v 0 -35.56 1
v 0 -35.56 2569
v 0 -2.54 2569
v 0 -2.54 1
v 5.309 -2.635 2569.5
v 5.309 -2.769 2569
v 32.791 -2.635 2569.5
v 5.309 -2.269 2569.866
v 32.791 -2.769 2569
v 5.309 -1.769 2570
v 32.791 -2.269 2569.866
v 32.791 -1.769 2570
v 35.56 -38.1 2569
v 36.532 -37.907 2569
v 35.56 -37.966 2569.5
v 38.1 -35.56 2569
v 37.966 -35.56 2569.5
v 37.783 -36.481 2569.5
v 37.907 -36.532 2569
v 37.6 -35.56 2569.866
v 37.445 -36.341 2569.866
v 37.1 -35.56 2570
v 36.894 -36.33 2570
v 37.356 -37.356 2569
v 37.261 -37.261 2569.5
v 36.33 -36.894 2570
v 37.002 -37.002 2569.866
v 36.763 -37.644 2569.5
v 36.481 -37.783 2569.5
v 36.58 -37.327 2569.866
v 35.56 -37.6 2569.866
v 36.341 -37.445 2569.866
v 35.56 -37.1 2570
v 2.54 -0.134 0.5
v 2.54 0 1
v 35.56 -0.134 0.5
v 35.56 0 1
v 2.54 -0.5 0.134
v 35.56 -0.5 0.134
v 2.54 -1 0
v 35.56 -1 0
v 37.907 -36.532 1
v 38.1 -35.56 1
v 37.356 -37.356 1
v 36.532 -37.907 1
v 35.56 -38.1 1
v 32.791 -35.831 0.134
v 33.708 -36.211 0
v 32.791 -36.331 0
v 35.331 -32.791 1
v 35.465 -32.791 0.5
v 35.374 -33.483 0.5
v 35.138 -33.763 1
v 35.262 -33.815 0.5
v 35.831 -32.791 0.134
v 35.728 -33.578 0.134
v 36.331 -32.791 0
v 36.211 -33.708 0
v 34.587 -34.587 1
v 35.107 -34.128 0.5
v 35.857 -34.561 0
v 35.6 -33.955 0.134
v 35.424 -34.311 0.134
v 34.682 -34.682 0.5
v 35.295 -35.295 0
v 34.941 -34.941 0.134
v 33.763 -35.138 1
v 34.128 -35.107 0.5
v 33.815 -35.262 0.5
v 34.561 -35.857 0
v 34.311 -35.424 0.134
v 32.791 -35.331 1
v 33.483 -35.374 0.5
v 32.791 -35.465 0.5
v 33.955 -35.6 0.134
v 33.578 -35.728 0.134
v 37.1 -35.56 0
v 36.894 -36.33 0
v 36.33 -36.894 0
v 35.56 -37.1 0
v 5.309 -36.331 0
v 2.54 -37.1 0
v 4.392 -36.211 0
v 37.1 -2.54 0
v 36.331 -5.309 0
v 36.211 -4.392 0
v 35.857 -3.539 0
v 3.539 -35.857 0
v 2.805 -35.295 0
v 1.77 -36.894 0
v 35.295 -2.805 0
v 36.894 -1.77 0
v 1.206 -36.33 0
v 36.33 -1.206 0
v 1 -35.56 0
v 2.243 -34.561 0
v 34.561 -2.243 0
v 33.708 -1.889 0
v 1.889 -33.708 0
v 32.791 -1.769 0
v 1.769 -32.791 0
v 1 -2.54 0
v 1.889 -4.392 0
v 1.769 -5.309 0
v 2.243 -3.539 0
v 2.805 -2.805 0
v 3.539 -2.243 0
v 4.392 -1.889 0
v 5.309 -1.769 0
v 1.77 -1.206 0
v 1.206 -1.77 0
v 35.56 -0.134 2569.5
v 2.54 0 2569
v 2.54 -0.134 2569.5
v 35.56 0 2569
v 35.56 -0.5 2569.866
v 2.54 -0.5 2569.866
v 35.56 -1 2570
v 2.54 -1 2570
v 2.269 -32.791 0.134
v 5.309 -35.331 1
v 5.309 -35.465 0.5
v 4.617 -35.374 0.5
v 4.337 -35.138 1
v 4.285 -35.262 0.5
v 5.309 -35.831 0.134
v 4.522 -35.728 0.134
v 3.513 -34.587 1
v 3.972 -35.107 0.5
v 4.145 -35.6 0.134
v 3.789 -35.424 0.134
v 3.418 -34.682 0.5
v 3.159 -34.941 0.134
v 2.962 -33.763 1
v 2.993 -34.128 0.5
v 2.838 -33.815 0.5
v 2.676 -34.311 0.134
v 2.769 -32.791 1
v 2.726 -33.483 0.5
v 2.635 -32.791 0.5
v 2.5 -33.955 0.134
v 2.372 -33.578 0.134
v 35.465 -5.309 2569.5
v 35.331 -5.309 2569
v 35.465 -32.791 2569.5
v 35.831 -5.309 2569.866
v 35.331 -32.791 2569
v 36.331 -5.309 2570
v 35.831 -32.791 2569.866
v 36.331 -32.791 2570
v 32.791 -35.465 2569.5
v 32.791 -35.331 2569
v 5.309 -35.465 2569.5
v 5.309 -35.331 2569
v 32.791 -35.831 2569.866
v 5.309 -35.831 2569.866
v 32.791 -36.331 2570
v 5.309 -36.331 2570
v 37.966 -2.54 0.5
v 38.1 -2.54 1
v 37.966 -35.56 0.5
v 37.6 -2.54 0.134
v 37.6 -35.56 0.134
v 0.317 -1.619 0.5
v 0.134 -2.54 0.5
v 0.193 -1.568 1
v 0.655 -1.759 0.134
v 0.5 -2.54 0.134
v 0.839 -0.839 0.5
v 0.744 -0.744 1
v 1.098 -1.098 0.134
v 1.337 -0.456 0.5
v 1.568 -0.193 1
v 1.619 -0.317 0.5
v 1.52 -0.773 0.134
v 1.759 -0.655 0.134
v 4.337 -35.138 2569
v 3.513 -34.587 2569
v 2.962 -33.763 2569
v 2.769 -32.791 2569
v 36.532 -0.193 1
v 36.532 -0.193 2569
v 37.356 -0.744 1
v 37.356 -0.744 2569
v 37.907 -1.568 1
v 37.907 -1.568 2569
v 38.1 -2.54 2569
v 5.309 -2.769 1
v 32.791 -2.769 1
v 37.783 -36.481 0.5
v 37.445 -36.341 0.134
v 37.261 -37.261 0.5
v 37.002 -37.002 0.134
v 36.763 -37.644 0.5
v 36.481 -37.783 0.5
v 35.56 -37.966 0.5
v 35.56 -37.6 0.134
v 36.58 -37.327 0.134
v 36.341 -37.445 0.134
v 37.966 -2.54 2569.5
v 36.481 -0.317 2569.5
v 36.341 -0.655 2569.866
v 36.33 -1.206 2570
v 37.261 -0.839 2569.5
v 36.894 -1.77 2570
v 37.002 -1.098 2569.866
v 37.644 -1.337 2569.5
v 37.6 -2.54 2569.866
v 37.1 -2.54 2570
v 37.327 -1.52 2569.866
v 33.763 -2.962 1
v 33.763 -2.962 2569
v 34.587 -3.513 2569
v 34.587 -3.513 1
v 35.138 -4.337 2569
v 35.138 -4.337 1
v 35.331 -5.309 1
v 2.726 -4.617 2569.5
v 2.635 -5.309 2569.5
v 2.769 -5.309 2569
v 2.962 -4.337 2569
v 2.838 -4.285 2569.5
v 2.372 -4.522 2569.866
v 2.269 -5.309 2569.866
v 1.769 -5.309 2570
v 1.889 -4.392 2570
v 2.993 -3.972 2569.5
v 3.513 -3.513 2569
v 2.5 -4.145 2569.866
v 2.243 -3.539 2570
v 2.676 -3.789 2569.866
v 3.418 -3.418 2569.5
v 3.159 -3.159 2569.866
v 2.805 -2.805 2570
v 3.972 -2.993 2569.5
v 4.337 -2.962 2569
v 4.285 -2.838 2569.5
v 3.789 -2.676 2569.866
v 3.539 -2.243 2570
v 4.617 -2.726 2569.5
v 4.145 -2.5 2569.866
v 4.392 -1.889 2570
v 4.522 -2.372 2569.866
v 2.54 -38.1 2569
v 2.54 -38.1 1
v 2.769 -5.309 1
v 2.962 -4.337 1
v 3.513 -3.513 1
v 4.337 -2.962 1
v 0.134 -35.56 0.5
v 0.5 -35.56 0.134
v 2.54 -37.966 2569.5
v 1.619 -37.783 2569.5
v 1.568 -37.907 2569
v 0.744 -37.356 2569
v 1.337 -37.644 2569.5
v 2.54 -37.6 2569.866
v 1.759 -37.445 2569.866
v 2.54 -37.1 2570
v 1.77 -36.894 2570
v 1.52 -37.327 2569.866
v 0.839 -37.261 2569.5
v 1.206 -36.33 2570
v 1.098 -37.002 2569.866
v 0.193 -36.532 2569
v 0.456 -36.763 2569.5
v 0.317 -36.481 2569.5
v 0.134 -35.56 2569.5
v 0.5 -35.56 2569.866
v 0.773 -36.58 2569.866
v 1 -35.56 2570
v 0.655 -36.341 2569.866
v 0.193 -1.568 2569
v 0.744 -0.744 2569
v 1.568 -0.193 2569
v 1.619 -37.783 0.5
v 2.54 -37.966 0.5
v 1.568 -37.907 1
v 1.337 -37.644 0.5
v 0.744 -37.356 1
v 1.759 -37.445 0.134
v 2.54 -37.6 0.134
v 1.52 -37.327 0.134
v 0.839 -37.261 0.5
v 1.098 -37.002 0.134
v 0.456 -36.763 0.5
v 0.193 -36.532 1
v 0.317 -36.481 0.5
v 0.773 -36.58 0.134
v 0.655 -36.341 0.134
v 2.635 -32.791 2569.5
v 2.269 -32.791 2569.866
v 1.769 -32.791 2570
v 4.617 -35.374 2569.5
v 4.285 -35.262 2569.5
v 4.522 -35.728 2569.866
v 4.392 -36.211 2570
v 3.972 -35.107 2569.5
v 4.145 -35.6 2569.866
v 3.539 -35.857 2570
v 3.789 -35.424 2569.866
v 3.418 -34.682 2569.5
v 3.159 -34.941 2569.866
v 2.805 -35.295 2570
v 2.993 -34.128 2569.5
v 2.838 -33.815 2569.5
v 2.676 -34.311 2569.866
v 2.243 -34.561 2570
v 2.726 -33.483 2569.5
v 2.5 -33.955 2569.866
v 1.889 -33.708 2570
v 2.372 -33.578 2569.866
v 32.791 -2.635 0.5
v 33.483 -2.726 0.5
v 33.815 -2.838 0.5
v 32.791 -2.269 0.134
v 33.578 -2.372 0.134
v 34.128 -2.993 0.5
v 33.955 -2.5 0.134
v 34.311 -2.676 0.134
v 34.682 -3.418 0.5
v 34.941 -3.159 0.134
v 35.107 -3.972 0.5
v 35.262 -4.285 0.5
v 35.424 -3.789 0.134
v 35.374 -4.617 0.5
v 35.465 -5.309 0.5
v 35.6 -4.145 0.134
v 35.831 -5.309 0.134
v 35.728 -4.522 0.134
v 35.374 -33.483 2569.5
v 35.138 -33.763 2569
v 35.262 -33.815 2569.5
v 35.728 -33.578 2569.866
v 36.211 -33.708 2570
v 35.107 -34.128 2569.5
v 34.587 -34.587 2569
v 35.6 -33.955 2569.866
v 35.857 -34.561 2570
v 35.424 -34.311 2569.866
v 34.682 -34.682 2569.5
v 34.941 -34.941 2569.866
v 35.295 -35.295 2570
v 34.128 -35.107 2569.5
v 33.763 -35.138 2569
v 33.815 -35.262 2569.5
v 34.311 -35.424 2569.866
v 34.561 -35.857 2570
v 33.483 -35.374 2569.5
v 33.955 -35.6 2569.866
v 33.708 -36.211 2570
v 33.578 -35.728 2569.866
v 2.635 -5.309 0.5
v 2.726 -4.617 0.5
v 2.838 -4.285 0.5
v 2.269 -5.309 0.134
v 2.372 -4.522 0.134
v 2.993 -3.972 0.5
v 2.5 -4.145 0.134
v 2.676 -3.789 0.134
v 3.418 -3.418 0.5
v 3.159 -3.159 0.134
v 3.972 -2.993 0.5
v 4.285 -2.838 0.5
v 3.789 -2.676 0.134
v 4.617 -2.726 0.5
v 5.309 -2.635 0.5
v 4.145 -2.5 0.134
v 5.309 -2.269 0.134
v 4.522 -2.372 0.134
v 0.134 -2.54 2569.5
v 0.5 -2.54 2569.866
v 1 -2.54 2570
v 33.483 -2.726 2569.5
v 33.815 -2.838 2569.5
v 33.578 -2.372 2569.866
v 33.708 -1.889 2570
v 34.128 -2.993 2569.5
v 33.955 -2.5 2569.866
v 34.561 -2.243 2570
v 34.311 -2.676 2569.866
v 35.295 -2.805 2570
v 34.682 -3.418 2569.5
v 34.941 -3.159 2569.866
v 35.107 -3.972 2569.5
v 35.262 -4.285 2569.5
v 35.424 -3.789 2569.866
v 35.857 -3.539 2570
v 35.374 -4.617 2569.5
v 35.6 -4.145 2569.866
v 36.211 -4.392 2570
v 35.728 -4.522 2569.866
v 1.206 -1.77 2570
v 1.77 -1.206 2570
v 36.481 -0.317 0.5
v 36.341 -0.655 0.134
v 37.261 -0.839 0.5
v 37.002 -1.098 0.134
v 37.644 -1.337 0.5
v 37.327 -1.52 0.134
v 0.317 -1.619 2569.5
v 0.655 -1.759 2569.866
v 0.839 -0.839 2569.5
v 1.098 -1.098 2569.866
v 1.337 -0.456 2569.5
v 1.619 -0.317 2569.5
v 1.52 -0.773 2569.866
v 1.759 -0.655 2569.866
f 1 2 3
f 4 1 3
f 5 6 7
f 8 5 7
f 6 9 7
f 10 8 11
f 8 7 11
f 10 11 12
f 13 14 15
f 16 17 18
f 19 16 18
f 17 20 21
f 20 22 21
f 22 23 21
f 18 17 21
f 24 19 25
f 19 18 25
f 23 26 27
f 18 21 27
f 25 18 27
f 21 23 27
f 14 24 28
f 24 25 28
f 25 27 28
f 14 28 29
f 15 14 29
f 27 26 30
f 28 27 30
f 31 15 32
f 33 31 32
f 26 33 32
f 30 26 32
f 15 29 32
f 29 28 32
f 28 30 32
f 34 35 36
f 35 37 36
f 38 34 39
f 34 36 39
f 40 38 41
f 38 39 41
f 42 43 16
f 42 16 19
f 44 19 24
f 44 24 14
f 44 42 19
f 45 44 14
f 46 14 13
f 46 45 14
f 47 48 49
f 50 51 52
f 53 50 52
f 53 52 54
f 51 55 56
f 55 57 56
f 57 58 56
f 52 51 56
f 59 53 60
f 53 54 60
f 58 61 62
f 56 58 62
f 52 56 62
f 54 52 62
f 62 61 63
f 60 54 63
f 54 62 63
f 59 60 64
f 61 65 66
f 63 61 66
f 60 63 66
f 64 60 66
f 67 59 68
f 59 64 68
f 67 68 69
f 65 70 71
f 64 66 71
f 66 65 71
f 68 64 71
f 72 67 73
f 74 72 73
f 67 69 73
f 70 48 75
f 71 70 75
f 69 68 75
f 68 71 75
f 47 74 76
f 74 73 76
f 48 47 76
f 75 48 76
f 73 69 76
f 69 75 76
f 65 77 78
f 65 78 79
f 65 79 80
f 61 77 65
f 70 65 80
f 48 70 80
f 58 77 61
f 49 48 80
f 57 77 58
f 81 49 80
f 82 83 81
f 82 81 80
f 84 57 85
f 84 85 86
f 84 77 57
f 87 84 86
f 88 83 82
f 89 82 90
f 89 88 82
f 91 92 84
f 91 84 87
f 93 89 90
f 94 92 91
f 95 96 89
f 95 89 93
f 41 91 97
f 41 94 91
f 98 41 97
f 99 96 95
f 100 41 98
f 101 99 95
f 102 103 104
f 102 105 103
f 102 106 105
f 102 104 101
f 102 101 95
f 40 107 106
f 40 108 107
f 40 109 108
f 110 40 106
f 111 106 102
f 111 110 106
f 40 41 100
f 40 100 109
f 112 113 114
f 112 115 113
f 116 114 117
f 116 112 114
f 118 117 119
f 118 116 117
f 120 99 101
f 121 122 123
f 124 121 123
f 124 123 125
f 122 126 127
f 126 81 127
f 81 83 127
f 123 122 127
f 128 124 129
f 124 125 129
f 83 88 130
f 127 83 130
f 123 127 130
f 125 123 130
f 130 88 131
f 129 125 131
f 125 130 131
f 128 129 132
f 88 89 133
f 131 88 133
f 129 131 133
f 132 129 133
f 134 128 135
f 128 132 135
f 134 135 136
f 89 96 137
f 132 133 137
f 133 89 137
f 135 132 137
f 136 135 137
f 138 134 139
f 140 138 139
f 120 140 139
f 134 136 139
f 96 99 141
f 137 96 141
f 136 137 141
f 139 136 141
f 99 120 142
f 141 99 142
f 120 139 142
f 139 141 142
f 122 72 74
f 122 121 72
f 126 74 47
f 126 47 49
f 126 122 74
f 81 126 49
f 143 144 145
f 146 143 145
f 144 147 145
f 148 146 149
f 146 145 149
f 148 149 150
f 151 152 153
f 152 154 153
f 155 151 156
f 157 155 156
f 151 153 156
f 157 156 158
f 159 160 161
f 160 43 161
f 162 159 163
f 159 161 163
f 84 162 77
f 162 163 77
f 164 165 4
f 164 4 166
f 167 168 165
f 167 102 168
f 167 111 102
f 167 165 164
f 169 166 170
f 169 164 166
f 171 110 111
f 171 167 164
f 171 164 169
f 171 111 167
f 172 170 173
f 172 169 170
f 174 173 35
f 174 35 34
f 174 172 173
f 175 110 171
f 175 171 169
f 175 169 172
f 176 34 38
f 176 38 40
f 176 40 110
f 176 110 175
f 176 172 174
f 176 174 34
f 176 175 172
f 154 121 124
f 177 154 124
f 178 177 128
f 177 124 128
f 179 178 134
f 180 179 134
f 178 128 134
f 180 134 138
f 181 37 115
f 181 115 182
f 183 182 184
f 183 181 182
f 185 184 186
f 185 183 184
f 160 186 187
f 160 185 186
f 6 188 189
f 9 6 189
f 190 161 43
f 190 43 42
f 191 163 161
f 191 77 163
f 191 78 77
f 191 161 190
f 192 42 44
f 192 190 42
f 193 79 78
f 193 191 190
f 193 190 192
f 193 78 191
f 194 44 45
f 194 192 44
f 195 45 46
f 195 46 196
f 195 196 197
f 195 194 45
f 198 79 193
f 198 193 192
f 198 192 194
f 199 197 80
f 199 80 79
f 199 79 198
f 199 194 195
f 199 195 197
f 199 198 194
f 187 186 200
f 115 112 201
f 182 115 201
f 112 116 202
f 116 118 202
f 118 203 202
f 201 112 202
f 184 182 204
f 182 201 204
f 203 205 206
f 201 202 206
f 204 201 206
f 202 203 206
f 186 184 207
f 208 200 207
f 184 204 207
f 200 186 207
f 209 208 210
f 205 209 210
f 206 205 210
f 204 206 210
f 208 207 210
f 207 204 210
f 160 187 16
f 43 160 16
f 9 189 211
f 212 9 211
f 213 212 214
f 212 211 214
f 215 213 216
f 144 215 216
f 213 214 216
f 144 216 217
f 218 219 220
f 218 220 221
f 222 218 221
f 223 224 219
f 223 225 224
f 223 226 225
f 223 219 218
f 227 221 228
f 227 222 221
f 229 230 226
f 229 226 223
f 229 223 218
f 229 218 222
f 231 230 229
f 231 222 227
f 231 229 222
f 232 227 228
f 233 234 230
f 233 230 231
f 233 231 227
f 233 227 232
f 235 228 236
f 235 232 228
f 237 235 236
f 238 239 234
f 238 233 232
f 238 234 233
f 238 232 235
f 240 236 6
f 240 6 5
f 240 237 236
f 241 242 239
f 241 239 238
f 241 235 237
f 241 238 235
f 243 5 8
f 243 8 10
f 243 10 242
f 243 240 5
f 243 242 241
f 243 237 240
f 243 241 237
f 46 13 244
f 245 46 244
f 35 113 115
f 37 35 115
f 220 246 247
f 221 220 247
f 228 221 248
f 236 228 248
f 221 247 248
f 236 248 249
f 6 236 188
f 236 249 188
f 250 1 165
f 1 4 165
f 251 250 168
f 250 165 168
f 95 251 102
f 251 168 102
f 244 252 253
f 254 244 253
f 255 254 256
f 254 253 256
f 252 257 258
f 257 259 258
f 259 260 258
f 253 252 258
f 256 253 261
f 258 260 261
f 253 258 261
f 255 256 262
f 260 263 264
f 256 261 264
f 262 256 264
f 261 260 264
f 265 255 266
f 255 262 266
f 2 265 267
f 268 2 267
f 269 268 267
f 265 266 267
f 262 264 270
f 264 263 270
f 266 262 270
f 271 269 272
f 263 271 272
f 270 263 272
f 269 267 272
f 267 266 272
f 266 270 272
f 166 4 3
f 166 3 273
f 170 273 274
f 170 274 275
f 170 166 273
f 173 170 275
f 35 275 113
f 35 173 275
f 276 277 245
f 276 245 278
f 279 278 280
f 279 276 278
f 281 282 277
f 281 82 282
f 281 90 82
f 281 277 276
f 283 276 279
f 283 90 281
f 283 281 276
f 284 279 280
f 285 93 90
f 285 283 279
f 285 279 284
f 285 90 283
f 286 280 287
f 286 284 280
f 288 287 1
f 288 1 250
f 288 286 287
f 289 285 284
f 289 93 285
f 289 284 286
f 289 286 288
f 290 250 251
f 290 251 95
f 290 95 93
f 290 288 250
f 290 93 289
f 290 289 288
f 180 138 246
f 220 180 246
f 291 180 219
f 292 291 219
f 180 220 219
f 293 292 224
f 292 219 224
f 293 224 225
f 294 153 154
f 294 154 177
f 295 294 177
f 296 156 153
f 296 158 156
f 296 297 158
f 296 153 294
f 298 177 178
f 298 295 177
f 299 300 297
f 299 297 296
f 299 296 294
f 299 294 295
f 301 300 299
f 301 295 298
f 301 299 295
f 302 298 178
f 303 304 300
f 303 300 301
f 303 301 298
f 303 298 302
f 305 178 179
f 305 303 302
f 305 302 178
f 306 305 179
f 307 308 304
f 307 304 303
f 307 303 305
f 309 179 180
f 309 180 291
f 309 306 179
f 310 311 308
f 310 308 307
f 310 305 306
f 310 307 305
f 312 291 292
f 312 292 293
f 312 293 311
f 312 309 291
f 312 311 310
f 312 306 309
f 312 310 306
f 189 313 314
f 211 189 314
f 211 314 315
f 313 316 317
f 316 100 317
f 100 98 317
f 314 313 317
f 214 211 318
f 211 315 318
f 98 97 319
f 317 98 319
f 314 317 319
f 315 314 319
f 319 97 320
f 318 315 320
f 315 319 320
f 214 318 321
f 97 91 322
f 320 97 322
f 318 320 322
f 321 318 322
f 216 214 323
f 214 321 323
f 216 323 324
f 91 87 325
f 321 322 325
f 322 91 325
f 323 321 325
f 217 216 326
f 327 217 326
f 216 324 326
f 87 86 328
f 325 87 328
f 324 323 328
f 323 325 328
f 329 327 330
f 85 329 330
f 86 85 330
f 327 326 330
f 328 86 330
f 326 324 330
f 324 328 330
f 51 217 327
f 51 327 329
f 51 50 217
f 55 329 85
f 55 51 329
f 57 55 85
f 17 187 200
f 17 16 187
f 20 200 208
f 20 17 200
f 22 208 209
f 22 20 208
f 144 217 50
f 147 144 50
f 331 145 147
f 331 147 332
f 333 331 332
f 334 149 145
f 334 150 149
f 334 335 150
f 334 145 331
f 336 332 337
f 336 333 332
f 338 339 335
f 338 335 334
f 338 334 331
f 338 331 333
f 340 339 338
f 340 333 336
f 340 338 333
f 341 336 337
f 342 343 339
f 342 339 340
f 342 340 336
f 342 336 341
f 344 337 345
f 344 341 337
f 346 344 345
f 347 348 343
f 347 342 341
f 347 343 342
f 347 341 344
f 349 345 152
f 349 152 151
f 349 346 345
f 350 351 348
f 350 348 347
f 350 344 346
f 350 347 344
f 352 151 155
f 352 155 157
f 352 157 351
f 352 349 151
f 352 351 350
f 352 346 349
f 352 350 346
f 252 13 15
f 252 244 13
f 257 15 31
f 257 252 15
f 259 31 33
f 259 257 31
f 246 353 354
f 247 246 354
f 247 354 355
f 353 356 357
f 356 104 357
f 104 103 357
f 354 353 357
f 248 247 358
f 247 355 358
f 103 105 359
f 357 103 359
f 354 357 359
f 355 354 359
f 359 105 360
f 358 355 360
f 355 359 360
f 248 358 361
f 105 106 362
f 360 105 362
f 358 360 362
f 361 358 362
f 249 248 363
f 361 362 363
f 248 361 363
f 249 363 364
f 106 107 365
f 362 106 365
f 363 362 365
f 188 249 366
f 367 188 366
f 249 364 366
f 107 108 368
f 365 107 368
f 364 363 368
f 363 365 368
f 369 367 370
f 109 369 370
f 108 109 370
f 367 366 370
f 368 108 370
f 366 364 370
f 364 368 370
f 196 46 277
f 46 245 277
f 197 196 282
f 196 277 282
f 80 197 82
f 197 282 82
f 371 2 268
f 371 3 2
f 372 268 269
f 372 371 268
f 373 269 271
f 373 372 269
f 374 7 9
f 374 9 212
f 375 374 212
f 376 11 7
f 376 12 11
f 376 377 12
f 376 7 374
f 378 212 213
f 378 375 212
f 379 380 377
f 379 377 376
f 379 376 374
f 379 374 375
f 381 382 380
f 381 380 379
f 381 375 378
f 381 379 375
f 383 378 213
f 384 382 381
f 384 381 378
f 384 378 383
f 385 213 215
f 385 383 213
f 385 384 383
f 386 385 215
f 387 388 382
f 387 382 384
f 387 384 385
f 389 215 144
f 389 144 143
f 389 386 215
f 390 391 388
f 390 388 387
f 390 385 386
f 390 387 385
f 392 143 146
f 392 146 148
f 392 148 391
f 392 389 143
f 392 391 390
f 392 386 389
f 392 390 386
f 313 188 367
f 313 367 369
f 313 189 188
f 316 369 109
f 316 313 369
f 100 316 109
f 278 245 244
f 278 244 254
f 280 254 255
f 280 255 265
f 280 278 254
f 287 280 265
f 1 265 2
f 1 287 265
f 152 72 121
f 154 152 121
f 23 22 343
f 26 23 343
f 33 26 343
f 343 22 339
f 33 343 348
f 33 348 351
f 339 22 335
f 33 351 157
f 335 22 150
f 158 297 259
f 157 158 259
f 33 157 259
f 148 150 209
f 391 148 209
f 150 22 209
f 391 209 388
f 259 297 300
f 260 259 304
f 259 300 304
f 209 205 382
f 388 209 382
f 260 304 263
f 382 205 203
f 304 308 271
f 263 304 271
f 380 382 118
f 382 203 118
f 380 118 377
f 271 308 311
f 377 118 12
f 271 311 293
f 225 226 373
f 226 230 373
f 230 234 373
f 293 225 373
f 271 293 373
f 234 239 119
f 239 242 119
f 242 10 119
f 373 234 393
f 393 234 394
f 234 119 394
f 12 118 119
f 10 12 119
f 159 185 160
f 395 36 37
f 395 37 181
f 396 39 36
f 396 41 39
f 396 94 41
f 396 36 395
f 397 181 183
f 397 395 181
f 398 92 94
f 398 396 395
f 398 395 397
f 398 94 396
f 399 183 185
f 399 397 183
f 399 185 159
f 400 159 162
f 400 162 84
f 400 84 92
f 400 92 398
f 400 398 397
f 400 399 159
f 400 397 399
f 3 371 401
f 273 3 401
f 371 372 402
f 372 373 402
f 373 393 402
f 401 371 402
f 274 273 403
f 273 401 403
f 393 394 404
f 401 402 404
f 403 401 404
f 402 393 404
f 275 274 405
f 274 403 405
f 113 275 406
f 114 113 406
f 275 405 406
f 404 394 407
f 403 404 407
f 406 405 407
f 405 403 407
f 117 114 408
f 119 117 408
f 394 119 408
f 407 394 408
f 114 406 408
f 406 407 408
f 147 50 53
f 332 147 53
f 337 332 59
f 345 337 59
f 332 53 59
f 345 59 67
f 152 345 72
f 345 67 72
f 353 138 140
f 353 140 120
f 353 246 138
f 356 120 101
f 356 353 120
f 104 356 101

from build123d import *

# Parameters (mm, degrees)
BOSS_EXTRUDE1_DEPTH = 2570
FILLET1_R           = 1


with BuildPart() as part:
    # Sketch1 → Boss-Extrude1 (new body)
    with BuildSketch(Plane.XY):
        with BuildLine():
            Line((2.54, 0), (35.56, 0))
            ThreePointArc((35.56, 0), (37.356051224, -0.743948776), (38.1, -2.54))
            Line((38.1, -2.54), (38.1, -35.56))
            ThreePointArc((38.1, -35.56), (37.356051224, -37.356051224), (35.56, -38.1))
            Line((35.56, -38.1), (2.54, -38.1))
            ThreePointArc((2.54, -38.1), (0.743948776, -37.356051224), (0, -35.56))
            Line((0, -35.56), (0, -2.54))
            ThreePointArc((0, -2.54), (0.743948776, -0.743948776), (2.54, 0))
        make_face()
        with BuildLine():
            Line((5.3086, -2.7686), (32.7914, -2.7686))
            ThreePointArc((32.7914, -2.7686), (34.587451224, -3.512548776), (35.3314, -5.3086))
            Line((35.3314, -5.3086), (35.3314, -32.7914))
            ThreePointArc((35.3314, -32.7914), (34.587451224, -34.587451224), (32.7914, -35.3314))
            Line((32.7914, -35.3314), (5.3086, -35.3314))
            ThreePointArc((5.3086, -35.3314), (3.512548776, -34.587451224), (2.7686, -32.7914))
            Line((2.7686, -32.7914), (2.7686, -5.3086))
            ThreePointArc((2.7686, -5.3086), (3.512548776, -3.512548776), (5.3086, -2.7686))
        make_face(mode=Mode.SUBTRACT)
    extrude(amount=BOSS_EXTRUDE1_DEPTH)

    # Fillet1
    fillet1_edges = [part.edges().sort_by_distance(p)[0] for p in [
        (37.356051224, -37.356051224, 2570),
        (19.05, -38.1, 0),
        (0.743948776, -37.356051224, 0),
        (38.1, -19.05, 2570),
        (37.356051224, -0.743948776, 2570),
        (19.05, 0, 2570),
        (0.743948776, -0.743948776, 2570),
        (0, -19.05, 2570),
        (3.512548776, -34.587451224, 0),
        (19.05, -35.3314, 0),
        (34.587451224, -34.587451224, 0),
        (35.3314, -19.05, 0),
        (34.587451224, -3.512548776, 0),
        (19.05, -2.7686, 0),
        (3.512548776, -3.512548776, 0),
        (2.7686, -19.05, 0),
        (3.512548776, -34.587451224, 2570),
        (19.05, -35.3314, 2570),
        (34.587451224, -34.587451224, 2570),
        (35.3314, -19.05, 2570),
        (34.587451224, -3.512548776, 2570),
        (19.05, -2.7686, 2570),
        (3.512548776, -3.512548776, 2570),
        (2.7686, -19.05, 2570),
        (0.743948776, -37.356051224, 2570),
        (19.05, -38.1, 2570),
        (0, -19.05, 0),
        (0.743948776, -0.743948776, 0),
        (19.05, 0, 0),
        (37.356051224, -0.743948776, 0),
        (38.1, -19.05, 0),
        (37.356051224, -37.356051224, 0),
    ]]
    fillet(fillet1_edges, radius=FILLET1_R)


solid = part.part
